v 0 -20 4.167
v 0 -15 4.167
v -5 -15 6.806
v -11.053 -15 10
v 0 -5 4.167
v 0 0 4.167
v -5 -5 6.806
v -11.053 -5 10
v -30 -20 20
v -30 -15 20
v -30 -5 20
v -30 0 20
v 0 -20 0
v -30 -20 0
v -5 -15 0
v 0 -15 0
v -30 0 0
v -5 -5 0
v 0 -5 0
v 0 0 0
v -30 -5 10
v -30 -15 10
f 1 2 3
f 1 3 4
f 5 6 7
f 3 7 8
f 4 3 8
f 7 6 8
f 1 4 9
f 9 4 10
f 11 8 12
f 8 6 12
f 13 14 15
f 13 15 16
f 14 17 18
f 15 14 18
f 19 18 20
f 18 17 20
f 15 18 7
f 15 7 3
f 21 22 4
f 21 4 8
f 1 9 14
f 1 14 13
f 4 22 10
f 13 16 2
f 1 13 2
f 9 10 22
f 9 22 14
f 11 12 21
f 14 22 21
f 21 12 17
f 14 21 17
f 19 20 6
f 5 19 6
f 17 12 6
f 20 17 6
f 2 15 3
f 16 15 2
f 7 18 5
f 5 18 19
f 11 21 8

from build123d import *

# Parameters (mm, degrees)
F1_DEPTH = 20
F2_W     = 10
F2_H     = 10
F3_DEPTH = 30.001
F4_W     = 5
F4_H     = 10
F5_DEPTH = 25


with BuildPart() as f1:
    # F0 (on Front) → F1 (new body)
    with BuildSketch(Plane.XZ):
        Polygon((0, 4.166667), (-30, 20), (-30, 0), (0, 0), align=None)
    extrude(amount=F1_DEPTH)

    # F2 (on Right) → F3 (cut, through all)
    with BuildSketch(Plane.YZ):
        with Locations((-10, 15)):
            Rectangle(F2_W, F2_H)
    extrude(amount=-F3_DEPTH, mode=Mode.SUBTRACT)

    # F4 (on face) → F5 (cut)
    with BuildSketch(Plane(origin=(0, 0, 0), x_dir=(1, 0, 0), z_dir=(0, 0, -1))):
        with Locations((-2.5, 10)):
            Rectangle(F4_W, F4_H)
    extrude(amount=-F5_DEPTH, mode=Mode.SUBTRACT)


solid = f1.part
